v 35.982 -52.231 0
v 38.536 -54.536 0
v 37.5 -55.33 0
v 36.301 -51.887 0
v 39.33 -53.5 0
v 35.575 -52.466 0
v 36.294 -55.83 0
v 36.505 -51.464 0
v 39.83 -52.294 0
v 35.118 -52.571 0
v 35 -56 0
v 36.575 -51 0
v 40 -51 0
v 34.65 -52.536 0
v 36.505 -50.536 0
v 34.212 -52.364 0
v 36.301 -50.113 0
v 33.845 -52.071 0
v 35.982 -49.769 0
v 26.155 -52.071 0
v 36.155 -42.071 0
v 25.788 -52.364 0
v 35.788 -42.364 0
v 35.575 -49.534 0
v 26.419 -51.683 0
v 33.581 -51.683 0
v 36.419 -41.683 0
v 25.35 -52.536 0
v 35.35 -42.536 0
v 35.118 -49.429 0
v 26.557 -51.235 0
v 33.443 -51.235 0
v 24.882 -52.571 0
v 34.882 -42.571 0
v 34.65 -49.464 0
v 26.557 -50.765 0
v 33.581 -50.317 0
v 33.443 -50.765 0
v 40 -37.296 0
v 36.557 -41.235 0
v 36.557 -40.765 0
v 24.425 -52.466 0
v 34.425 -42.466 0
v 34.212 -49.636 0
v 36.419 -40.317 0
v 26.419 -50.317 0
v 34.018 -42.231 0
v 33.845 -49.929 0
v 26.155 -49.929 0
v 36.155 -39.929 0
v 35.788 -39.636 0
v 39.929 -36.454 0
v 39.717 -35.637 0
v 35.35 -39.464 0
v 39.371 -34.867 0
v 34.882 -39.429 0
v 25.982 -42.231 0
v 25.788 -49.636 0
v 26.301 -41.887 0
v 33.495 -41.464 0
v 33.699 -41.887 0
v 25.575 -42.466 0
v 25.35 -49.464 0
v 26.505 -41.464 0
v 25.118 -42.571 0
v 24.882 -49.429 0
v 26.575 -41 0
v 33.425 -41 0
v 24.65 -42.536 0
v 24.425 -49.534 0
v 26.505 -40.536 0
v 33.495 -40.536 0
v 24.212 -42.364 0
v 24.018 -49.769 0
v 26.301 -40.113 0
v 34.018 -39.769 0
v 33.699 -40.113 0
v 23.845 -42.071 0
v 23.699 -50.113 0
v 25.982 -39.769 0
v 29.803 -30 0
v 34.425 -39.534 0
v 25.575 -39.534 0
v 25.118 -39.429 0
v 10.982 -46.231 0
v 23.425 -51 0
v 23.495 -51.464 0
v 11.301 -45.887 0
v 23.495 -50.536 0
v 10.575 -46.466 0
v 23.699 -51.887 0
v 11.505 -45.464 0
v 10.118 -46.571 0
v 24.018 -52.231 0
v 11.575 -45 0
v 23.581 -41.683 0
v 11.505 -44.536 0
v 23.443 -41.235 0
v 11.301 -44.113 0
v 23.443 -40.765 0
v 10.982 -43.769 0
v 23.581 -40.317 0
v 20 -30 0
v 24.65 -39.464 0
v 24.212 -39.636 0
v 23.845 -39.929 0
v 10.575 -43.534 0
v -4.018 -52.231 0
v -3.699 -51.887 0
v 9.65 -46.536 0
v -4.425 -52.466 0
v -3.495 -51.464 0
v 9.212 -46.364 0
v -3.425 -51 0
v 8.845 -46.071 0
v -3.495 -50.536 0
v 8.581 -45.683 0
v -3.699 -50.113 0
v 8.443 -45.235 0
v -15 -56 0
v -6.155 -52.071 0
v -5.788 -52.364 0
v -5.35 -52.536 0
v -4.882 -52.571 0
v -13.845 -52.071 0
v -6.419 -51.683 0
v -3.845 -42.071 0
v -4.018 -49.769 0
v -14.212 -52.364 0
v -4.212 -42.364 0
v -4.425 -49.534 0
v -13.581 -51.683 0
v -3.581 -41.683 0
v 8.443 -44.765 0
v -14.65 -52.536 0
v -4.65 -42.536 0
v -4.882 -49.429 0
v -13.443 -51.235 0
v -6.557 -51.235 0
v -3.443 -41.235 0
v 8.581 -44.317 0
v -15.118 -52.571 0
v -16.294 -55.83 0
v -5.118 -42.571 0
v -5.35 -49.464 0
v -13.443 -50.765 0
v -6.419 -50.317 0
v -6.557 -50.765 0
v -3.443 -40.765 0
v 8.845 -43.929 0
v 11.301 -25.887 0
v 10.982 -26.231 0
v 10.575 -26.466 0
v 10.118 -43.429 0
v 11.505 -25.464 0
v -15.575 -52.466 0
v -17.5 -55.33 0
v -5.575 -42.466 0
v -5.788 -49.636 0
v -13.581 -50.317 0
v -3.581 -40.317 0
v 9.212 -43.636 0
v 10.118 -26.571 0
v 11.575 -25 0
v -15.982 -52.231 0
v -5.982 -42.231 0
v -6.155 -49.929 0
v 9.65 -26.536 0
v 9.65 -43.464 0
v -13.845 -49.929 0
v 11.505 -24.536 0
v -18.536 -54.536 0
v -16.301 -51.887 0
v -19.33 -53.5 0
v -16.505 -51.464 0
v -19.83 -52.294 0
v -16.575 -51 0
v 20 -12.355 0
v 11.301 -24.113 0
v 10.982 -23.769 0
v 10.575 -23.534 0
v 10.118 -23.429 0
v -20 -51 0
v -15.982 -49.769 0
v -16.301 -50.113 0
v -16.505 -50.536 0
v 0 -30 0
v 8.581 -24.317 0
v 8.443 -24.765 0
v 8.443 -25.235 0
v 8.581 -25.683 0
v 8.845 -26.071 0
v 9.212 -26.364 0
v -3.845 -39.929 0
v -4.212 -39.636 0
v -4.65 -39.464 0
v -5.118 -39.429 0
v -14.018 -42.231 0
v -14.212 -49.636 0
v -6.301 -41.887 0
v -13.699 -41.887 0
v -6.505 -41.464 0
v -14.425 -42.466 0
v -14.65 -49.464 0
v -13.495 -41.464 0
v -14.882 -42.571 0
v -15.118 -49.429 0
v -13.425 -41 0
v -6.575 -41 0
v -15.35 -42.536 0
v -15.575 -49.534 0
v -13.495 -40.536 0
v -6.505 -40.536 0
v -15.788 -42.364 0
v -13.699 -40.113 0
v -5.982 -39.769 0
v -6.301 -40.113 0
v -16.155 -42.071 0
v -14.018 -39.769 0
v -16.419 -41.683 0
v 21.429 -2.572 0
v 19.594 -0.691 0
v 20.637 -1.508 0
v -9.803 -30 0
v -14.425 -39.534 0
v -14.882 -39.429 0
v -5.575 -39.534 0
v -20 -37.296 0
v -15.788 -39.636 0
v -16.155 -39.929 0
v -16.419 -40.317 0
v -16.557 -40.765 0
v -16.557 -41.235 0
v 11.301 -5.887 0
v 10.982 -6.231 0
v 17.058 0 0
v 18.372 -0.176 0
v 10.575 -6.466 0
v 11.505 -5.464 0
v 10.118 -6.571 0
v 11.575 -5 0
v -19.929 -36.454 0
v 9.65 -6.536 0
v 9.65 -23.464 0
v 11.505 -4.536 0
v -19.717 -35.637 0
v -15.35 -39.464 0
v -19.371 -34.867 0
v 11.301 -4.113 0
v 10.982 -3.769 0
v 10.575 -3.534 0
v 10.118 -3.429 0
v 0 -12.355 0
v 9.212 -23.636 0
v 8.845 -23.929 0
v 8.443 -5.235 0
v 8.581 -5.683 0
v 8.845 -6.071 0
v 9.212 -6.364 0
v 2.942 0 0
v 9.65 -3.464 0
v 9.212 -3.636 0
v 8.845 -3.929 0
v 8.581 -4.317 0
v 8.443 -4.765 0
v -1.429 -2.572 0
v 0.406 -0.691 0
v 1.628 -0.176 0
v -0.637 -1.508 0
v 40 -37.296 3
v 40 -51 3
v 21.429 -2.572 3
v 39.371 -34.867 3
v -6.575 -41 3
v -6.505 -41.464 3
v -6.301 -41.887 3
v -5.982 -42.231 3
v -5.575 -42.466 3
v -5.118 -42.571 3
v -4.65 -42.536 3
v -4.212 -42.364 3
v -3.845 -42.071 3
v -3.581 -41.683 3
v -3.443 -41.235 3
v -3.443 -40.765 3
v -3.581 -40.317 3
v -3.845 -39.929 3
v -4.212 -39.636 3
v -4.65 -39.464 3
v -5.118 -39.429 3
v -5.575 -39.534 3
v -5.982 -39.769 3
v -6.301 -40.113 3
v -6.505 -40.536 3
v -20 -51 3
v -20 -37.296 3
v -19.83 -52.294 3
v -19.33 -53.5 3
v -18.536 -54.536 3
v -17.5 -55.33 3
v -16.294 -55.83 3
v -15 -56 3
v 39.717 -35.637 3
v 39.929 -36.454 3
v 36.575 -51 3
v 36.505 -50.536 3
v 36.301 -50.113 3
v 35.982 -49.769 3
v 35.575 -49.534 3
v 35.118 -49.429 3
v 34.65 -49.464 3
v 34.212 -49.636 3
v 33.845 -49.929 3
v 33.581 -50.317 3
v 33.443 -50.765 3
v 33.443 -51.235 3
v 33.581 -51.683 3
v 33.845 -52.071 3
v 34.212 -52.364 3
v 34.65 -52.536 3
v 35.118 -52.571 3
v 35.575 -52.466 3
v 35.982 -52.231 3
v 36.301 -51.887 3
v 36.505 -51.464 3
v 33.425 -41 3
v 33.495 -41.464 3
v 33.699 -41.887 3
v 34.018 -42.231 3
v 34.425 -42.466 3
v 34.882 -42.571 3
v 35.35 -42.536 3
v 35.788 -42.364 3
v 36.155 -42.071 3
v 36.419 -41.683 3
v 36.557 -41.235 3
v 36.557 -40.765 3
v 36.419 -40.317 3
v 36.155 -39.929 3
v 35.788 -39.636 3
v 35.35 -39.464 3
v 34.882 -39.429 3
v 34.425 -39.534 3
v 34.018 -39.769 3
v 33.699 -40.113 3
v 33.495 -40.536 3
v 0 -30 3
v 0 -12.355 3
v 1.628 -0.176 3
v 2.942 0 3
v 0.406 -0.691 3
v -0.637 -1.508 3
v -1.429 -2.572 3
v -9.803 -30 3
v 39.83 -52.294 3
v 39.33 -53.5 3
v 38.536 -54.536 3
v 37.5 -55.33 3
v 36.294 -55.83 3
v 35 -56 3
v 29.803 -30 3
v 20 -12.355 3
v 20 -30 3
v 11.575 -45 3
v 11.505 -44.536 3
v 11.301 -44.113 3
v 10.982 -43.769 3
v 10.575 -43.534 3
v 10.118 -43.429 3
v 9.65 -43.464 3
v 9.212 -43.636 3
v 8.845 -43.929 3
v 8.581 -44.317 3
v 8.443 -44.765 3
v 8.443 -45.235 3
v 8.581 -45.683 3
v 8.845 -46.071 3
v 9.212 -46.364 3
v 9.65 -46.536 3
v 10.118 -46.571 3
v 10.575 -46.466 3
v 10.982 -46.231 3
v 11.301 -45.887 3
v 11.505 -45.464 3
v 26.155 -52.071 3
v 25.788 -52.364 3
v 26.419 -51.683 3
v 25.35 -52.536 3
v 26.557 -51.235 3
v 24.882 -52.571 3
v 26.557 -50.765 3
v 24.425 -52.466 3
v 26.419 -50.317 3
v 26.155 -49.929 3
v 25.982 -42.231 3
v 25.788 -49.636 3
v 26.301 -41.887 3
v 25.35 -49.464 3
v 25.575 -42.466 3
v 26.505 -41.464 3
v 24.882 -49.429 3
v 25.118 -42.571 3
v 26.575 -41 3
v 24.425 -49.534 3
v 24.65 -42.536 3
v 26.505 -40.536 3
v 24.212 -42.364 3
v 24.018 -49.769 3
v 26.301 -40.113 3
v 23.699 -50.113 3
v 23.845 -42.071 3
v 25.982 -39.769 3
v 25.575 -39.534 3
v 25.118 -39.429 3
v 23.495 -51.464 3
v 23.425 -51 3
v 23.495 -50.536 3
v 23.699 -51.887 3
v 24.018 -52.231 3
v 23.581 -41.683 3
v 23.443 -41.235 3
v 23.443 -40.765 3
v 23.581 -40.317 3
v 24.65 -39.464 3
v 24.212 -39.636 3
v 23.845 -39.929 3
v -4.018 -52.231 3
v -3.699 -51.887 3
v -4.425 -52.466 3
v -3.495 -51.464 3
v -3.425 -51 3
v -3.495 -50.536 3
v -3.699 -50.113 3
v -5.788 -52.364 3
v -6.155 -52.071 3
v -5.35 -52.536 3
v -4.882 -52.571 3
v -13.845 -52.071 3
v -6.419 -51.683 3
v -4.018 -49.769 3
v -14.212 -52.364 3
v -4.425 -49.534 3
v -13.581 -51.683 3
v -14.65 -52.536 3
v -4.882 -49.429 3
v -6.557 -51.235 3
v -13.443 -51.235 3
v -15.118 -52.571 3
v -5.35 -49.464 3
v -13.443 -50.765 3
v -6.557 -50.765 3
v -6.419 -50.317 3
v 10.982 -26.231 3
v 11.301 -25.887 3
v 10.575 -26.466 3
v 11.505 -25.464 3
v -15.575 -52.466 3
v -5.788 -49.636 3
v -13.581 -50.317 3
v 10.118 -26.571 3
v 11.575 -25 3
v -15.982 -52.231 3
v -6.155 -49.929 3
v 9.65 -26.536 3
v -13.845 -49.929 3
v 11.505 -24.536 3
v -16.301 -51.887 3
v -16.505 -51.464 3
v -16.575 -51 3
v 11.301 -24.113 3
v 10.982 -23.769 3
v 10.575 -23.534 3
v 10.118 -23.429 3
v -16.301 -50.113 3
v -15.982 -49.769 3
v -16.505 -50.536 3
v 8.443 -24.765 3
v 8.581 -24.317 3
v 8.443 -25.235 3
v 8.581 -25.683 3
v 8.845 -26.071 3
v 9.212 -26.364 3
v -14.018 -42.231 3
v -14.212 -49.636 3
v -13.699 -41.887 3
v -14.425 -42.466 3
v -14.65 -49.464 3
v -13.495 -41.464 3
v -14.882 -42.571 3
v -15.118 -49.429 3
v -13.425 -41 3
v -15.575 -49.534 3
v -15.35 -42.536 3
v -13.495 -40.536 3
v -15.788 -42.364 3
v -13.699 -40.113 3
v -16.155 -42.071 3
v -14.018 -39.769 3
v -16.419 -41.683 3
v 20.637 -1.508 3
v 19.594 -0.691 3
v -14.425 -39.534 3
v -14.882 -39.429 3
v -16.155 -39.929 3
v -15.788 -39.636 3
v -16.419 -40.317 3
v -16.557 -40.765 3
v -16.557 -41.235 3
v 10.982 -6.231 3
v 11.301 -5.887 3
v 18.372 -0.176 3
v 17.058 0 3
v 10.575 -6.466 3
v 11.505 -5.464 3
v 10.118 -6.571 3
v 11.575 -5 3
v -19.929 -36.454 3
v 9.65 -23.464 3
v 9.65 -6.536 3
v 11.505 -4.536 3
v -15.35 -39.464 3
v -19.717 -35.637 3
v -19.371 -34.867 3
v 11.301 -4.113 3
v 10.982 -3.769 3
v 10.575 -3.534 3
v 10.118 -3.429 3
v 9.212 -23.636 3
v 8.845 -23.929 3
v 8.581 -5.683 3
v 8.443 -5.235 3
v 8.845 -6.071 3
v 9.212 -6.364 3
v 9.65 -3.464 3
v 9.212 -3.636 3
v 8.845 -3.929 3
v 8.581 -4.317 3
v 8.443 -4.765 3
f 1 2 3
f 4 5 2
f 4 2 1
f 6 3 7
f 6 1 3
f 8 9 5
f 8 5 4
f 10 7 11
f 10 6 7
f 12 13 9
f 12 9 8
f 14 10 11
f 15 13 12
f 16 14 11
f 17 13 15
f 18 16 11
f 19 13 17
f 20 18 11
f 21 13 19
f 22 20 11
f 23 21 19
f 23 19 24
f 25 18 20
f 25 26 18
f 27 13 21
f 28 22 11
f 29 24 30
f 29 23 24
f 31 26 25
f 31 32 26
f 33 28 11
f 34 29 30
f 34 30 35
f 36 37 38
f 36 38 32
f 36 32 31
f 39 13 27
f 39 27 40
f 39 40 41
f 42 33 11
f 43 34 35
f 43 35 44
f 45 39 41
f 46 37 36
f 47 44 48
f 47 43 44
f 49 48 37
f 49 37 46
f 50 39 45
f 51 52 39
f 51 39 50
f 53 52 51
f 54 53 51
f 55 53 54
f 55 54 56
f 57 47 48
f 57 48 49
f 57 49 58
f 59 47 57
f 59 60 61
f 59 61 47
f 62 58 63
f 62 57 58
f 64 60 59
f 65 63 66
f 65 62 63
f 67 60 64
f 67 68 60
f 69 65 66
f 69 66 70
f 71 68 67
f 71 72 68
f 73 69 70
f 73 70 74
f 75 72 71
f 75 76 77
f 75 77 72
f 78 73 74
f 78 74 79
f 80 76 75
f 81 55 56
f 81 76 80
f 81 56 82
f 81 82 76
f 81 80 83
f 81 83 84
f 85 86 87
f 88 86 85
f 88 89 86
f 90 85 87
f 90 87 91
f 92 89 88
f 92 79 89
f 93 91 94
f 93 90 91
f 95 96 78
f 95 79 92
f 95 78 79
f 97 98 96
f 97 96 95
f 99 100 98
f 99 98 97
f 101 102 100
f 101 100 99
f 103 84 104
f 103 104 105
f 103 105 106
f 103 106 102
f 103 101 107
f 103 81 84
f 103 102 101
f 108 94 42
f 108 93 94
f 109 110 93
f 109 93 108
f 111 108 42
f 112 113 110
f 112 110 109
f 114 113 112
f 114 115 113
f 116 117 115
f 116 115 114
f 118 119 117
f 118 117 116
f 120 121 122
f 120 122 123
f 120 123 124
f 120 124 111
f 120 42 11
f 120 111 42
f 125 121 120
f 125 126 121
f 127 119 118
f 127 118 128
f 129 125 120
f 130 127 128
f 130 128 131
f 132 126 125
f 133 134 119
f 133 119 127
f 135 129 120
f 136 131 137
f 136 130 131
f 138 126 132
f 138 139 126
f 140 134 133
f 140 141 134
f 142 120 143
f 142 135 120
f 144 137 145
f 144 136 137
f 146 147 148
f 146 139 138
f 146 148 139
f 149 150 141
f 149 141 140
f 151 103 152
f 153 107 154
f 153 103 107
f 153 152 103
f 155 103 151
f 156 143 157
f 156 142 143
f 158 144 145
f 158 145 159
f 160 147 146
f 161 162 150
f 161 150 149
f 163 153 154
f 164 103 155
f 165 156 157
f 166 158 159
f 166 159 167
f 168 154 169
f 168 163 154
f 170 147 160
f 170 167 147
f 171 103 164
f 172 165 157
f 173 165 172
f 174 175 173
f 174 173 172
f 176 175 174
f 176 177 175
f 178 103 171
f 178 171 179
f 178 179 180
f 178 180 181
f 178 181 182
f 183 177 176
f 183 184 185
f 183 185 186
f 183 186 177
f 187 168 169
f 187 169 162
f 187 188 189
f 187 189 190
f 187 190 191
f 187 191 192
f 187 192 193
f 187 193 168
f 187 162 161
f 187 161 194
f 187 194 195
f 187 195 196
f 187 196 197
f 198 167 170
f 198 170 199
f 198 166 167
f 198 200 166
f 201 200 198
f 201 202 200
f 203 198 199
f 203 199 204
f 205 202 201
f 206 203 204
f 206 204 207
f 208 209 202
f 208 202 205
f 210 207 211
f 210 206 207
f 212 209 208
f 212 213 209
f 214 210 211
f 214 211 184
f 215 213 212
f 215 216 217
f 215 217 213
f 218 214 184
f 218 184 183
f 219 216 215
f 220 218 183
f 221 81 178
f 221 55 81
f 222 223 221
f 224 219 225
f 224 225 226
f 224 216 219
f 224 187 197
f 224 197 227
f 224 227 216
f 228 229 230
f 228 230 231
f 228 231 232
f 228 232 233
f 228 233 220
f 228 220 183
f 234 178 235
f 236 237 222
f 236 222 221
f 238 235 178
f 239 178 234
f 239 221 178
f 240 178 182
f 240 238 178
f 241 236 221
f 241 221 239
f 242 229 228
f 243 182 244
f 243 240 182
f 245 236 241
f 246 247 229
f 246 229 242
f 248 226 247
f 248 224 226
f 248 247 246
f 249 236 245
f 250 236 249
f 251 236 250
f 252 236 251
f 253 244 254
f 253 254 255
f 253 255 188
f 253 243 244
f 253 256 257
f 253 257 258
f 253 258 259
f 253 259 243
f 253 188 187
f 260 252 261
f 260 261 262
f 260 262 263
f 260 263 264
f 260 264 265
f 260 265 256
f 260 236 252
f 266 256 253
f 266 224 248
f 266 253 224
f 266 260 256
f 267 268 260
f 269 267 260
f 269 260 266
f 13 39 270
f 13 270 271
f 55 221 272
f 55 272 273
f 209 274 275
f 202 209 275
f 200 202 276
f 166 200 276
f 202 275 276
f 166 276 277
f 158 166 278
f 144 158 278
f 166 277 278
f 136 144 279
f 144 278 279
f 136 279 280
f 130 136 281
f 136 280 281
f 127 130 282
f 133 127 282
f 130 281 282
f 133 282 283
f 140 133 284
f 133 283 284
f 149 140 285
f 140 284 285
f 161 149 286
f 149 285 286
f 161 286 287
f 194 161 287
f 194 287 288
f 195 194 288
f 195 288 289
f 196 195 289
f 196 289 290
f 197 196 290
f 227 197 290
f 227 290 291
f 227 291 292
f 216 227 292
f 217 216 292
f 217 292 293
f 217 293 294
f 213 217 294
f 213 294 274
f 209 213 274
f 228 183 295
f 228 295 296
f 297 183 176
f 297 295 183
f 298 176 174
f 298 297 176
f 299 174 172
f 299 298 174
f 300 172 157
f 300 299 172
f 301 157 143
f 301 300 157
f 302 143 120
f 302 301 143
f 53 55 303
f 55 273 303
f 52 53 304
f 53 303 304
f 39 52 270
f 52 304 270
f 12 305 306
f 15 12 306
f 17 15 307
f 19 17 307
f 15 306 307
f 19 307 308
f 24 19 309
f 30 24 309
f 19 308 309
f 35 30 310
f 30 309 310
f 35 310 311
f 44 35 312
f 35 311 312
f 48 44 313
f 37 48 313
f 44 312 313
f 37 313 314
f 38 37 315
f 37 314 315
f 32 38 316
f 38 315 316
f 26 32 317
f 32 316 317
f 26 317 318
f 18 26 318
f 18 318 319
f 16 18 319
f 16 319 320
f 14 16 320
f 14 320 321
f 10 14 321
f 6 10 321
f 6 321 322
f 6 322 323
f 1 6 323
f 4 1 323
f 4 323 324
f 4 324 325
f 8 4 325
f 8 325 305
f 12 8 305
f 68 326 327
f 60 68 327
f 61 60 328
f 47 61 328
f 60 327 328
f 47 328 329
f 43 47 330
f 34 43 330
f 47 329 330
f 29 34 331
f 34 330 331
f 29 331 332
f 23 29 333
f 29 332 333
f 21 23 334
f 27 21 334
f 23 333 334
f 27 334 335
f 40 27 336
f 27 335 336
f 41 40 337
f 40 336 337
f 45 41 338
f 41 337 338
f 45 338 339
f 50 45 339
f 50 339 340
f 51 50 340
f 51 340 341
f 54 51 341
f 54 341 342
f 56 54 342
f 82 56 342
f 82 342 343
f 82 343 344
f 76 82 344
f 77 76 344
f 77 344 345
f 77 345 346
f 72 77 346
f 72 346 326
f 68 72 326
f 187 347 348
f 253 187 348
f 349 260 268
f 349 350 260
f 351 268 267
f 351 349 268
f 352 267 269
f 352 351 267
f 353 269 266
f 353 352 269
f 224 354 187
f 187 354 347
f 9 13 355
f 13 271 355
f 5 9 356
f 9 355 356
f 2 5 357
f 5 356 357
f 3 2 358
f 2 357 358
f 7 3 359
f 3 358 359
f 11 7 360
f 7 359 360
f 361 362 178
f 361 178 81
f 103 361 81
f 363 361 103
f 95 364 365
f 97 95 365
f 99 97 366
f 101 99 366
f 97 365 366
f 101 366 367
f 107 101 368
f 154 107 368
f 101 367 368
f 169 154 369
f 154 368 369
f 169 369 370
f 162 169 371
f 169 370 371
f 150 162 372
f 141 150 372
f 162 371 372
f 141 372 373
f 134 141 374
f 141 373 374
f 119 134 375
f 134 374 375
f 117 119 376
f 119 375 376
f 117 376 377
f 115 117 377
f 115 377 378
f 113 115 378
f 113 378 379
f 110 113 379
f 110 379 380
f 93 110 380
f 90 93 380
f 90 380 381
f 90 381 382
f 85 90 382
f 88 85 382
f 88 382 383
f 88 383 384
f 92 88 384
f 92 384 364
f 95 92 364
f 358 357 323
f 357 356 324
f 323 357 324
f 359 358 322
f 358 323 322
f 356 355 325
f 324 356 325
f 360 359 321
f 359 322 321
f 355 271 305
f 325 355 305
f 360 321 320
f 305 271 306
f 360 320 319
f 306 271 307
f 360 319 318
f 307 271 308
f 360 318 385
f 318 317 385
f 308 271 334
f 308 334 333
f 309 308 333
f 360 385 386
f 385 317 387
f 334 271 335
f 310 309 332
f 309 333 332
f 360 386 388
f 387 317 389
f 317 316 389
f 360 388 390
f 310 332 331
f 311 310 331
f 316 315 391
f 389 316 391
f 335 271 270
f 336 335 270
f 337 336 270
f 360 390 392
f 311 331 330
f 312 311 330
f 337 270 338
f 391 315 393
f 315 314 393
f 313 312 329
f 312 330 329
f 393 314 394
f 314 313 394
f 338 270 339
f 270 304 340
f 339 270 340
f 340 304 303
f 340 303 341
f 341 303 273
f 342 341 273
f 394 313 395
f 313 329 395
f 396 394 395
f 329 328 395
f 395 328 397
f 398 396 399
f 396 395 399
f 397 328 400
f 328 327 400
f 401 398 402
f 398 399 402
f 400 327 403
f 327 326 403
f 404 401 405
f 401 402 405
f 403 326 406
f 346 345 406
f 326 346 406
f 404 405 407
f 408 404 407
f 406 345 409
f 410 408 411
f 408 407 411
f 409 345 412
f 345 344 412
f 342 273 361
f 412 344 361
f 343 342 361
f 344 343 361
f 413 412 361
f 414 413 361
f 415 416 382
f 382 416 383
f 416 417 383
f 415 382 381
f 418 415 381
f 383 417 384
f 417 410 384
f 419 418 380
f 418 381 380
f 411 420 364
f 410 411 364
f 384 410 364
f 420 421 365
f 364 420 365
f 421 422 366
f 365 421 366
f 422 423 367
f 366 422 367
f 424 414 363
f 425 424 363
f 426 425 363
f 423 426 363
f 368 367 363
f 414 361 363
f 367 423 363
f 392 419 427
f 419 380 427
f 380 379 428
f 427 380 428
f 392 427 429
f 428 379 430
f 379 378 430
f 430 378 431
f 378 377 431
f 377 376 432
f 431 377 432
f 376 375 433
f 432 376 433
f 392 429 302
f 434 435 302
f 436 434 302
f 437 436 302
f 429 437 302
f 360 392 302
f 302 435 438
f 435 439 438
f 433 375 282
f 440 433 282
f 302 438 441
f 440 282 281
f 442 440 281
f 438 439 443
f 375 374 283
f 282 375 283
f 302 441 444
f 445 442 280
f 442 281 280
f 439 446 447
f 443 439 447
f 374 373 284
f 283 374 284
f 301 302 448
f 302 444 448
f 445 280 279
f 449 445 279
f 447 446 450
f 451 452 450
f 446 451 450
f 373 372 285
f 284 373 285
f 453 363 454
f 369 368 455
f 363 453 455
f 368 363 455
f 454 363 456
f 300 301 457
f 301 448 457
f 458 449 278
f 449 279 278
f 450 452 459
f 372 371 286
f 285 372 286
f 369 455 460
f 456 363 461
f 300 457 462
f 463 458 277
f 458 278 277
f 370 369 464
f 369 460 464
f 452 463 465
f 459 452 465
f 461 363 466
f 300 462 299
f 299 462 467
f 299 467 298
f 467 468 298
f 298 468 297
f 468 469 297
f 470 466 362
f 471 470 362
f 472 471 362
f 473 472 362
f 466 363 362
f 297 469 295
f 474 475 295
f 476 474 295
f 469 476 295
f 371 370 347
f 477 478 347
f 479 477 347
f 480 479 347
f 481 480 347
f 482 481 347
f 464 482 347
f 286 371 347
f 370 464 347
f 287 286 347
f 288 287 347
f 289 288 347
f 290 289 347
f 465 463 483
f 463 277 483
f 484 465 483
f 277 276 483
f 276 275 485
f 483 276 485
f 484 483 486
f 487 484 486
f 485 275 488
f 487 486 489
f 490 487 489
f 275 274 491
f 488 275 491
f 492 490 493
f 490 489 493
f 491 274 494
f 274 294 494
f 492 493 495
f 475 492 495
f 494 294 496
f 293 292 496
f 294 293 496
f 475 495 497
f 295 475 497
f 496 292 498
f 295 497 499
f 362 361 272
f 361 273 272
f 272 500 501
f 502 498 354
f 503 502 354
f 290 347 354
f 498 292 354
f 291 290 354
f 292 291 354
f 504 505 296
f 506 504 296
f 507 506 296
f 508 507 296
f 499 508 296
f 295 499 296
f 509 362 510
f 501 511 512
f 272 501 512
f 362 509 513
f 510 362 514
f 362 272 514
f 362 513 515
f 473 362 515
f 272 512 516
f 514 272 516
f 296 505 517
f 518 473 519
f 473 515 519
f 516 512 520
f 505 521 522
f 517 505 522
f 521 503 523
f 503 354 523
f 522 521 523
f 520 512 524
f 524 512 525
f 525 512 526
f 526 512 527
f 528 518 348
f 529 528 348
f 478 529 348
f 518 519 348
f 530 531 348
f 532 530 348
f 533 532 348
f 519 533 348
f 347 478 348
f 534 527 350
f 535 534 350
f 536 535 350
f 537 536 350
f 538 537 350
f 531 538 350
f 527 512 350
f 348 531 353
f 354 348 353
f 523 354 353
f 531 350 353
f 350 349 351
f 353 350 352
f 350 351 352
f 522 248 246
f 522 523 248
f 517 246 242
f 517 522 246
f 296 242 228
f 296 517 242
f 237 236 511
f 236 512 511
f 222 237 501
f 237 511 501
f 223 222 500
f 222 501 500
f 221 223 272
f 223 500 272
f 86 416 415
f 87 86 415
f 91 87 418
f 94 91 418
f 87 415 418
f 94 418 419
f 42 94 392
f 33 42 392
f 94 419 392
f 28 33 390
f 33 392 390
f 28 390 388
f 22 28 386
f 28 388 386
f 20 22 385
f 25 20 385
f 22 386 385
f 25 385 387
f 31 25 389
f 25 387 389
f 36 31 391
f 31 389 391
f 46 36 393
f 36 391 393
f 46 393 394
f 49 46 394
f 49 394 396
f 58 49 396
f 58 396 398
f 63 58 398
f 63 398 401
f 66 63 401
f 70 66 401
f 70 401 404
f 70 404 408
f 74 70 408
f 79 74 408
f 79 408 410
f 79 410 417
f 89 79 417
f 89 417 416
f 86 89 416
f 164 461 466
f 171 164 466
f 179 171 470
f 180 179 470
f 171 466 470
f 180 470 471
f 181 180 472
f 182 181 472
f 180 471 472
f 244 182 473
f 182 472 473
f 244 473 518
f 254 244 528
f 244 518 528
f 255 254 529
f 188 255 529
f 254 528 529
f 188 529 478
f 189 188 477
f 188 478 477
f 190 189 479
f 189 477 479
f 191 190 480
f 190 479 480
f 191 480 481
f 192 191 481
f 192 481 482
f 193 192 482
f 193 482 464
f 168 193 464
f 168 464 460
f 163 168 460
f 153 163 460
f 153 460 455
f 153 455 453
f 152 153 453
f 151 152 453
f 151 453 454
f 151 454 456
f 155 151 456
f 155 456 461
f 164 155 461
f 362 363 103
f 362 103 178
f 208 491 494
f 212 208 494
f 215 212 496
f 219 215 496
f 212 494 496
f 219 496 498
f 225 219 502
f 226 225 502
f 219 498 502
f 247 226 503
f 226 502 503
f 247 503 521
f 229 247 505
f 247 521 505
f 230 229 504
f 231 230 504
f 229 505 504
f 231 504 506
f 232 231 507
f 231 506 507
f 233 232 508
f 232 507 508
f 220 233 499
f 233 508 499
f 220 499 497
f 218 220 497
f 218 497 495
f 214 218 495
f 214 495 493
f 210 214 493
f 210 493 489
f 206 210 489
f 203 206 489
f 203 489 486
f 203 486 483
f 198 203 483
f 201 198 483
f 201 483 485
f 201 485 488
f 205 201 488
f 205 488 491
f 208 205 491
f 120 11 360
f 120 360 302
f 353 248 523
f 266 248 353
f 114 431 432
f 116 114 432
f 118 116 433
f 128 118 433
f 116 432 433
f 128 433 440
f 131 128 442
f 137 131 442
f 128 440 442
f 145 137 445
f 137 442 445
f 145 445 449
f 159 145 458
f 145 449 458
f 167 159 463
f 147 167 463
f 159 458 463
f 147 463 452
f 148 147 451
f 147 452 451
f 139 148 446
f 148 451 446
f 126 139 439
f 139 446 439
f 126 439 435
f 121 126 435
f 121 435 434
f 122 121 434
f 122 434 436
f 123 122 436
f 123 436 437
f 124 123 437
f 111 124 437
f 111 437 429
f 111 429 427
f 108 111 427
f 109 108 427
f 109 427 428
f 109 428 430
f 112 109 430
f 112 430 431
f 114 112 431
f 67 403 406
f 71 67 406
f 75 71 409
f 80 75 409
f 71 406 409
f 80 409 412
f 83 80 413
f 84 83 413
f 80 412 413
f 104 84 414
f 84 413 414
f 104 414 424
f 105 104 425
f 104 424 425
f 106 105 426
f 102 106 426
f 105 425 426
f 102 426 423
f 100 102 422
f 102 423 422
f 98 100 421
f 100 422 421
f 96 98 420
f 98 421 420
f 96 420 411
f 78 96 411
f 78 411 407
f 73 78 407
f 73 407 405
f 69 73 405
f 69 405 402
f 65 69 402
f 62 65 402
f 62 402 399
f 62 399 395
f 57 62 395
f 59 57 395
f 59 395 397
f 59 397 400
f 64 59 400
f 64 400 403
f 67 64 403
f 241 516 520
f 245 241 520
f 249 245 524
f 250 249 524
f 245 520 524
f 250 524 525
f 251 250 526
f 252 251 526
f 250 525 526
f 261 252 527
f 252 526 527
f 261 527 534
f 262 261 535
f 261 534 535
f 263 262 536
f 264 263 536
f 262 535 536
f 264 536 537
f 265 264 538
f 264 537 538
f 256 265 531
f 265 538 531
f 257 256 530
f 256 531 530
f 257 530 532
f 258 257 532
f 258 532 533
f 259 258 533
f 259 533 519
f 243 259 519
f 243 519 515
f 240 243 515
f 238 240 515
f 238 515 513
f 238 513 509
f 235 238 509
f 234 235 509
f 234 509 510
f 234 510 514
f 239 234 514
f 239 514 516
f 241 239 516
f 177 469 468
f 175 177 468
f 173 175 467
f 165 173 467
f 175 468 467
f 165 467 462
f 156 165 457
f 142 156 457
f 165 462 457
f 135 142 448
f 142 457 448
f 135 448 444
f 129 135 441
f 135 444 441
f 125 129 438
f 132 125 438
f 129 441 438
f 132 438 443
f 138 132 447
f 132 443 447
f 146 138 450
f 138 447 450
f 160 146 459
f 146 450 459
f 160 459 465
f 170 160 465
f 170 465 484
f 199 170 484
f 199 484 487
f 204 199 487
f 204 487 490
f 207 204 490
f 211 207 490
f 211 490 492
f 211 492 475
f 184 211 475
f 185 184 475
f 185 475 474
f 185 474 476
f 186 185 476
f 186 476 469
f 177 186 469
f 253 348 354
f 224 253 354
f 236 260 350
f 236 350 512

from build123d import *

# Parameters (mm, degrees)
EXTRUDE_1_DEPTH     = 3
SKETCH_2_R          = 1.575
CUT_EXTRUDE_1_DEPTH = 69.883960397
FILLET_1_R          = 5


with BuildPart() as part:
    # 草图1 → 凸台-拉伸1 (new body)
    with BuildSketch(Plane.XY):
        Polygon((0, 0), (20, 0), (40, -36), (40, -56), (-20, -56), (-20, -36), align=None)
    extrude(amount=EXTRUDE_1_DEPTH)

    # 草图2 → 切除-拉伸1 (cut, through all)
    with BuildSketch(Plane.XY.offset(3)):
        with Locations((-15, -41)):
            Circle(SKETCH_2_R)
        with Locations(Location((-5, -41, 0), (0, 0, 180))):
            Circle(SKETCH_2_R)
        with Locations((-5, -51)):
            Circle(SKETCH_2_R)
        with Locations(Location((-15, -51, 0), (0, 0, 180))):
            Circle(SKETCH_2_R)
        with Locations((35, -51)):
            Circle(SKETCH_2_R)
        with Locations(Location((25, -51, 0), (0, 0, 180))):
            Circle(SKETCH_2_R)
        with Locations((25, -41)):
            Circle(SKETCH_2_R)
        with Locations(Location((35, -41, 0), (0, 0, 180))):
            Circle(SKETCH_2_R)
        with Locations((10, -25)):
            Circle(SKETCH_2_R)
        with Locations((10, -5)):
            Circle(SKETCH_2_R)
        with Locations((10, -45)):
            Circle(SKETCH_2_R)
        Polygon((0, -12.354756169), (-9.802913239, -30), (0, -30), align=None)
        Polygon((29.802913239, -30), (20, -30), (20, -12.354756169), align=None)
    extrude(amount=-CUT_EXTRUDE_1_DEPTH, mode=Mode.SUBTRACT)

    # 圆角1
    fillet_1_edges = [part.edges().sort_by_distance(p)[0] for p in [
        (0, 0, 1.5),
        (20, 0, 1.5),
        (40, -36, 1.5),
        (40, -56, 1.5),
        (-20, -56, 1.5),
        (-20, -36, 1.5),
    ]]
    fillet(fillet_1_edges, radius=FILLET_1_R)


solid = part.part
